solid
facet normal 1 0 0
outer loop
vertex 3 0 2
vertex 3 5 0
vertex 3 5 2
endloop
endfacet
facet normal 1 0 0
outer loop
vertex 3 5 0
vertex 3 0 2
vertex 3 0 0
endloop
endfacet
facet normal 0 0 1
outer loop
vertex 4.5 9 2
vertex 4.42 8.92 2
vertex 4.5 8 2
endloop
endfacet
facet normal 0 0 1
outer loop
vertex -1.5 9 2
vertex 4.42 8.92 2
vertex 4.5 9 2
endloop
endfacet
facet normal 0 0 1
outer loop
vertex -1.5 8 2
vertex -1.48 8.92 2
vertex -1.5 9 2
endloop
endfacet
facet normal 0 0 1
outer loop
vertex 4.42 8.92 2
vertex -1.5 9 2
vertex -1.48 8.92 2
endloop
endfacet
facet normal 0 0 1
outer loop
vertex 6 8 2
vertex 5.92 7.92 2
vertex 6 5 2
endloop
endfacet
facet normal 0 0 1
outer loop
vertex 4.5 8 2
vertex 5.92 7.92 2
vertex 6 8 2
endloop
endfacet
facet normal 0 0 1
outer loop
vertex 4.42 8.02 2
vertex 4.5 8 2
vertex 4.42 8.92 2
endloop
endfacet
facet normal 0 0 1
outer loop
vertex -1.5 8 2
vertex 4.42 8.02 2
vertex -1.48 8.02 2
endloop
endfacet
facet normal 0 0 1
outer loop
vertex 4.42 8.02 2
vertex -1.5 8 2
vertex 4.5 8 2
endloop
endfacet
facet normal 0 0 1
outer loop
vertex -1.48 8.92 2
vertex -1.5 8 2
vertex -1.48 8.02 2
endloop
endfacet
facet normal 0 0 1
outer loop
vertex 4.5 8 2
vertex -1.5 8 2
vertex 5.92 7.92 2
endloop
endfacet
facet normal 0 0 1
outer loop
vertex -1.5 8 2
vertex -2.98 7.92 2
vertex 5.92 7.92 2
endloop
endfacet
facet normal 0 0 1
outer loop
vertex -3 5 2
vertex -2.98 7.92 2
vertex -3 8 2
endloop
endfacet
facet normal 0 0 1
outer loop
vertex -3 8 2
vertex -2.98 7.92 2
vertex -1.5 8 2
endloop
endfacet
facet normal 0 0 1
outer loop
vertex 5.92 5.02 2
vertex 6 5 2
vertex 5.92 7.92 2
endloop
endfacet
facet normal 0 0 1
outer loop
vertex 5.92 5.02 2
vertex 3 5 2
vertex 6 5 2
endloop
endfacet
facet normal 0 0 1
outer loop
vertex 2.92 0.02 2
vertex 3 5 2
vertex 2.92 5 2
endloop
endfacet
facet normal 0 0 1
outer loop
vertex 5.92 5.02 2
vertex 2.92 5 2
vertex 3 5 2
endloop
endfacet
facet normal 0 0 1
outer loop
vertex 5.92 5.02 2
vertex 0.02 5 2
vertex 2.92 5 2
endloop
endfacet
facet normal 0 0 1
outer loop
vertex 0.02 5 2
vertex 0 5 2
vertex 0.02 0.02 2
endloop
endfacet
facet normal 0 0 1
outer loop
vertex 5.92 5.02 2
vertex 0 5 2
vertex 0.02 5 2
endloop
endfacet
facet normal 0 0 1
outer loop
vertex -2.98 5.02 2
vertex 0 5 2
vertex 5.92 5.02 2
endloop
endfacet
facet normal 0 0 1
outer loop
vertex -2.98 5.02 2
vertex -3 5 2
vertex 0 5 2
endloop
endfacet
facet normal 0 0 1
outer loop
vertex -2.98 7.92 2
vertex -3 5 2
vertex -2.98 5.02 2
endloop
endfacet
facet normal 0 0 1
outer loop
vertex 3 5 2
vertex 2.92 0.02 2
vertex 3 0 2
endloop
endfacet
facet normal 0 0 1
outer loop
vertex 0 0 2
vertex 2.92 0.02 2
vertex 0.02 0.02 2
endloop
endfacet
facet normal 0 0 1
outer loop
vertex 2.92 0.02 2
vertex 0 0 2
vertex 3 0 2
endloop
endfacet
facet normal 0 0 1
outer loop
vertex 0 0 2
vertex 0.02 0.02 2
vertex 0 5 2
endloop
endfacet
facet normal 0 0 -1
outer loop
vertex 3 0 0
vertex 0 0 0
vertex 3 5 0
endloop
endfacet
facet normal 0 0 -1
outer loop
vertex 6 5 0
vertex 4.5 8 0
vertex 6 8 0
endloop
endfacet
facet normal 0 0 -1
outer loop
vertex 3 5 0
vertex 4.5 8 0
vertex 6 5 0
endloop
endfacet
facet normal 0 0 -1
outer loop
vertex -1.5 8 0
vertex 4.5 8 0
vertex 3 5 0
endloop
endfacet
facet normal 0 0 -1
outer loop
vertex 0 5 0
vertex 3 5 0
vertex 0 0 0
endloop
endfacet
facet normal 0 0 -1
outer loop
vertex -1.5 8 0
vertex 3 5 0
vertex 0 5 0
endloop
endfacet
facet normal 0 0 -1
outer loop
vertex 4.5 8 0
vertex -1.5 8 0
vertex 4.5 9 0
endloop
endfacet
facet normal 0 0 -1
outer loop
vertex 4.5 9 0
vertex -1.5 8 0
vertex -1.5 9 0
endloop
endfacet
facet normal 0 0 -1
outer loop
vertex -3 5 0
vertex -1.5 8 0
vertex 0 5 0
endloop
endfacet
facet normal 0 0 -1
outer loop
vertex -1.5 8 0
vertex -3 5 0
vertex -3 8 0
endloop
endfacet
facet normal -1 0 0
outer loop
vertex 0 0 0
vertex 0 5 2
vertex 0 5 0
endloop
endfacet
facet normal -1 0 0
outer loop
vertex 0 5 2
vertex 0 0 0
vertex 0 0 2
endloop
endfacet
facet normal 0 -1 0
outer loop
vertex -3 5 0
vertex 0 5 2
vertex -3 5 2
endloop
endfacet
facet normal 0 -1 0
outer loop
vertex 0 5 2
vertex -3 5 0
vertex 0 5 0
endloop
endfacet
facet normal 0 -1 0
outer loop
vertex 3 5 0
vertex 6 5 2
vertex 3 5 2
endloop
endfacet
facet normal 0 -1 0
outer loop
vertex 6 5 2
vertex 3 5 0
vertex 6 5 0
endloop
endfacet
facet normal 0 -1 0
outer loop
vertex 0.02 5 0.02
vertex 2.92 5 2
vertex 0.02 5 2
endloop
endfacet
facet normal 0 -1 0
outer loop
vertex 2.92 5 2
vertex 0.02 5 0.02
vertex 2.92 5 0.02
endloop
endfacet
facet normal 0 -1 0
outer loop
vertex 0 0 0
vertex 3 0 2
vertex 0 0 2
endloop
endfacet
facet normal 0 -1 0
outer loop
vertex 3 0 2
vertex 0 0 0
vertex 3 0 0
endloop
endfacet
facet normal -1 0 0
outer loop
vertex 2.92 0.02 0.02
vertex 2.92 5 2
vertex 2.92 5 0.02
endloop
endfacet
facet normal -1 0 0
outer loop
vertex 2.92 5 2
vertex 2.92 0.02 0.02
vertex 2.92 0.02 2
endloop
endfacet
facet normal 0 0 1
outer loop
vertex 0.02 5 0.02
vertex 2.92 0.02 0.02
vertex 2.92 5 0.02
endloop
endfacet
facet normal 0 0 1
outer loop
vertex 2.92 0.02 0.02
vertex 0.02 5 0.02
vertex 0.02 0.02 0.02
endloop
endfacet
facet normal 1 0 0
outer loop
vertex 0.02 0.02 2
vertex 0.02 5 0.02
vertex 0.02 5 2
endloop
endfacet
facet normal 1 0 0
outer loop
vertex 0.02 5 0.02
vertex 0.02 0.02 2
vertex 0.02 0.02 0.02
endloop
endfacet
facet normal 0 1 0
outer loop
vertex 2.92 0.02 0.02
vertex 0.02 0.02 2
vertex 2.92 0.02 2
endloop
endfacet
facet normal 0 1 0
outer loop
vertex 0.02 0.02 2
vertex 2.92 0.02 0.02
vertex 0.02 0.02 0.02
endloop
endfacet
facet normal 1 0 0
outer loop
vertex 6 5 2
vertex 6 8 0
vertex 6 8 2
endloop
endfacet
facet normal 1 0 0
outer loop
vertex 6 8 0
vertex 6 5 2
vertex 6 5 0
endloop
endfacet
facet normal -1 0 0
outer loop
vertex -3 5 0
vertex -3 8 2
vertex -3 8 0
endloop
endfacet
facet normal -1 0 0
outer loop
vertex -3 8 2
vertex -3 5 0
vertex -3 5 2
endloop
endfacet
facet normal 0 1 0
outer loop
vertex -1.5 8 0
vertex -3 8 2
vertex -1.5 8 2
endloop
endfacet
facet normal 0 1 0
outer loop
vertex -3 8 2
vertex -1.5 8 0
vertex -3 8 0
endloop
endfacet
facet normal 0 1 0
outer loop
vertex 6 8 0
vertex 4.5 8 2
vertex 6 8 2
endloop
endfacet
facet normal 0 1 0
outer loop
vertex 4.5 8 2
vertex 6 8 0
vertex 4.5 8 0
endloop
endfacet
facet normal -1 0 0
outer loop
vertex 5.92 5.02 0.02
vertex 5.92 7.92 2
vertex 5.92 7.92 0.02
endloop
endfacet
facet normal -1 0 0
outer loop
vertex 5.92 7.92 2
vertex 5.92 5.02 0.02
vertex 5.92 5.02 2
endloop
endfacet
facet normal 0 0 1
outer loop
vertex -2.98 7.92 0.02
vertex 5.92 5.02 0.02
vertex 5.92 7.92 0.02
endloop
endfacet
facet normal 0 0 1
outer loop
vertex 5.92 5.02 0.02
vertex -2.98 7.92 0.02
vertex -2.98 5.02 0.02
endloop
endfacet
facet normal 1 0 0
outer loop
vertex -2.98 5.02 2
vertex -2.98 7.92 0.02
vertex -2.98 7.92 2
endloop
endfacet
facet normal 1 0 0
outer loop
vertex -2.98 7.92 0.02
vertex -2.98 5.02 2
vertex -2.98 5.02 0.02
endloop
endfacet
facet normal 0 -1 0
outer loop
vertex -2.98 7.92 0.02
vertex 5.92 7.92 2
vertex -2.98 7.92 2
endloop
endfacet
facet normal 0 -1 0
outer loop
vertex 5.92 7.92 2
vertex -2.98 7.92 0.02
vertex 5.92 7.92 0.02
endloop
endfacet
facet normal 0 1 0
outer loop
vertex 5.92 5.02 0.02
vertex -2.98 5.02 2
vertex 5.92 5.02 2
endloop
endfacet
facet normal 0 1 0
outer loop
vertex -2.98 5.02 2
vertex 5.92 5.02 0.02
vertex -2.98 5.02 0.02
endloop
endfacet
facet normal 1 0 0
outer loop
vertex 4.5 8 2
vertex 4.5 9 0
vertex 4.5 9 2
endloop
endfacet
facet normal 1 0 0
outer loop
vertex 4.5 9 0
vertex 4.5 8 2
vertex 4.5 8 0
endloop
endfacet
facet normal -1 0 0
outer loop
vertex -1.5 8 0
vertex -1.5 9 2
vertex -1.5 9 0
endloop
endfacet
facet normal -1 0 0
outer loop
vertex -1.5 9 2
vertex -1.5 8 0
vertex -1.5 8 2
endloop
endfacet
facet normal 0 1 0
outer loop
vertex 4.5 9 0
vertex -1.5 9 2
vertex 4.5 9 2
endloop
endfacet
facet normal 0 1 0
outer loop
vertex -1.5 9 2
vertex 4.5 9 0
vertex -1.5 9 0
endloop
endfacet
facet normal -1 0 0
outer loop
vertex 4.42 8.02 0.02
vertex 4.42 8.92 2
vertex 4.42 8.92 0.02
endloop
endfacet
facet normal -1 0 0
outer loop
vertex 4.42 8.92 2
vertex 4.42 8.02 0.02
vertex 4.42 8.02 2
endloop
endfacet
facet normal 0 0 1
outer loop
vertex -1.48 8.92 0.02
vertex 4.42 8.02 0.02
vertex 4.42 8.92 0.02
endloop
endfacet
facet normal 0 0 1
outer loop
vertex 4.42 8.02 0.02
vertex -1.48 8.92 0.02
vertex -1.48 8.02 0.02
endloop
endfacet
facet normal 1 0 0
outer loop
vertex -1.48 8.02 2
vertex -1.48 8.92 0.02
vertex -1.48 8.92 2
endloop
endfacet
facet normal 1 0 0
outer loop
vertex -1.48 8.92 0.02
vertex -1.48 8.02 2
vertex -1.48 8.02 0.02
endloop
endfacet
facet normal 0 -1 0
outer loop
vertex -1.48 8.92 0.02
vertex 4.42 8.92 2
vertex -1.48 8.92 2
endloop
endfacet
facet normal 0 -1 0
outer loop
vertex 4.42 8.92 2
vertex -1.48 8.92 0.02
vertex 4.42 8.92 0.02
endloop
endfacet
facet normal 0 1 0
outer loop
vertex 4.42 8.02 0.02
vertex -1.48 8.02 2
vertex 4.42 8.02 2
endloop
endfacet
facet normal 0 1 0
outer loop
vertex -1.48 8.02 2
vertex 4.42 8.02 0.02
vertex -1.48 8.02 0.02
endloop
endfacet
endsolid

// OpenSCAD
//Question 3
//color("#088F8F"){
//    cube([6, 2, 2]);
//    translate([-1, 2, 0])
//        cube([8, 3, 2]);
//    translate([1.5, 5, 0])
//        cube([3, 5, 2]);
//    }

//OR
color("#088F8F", 1){
  difference(){
        cube([3, 5, 2]);
        translate([0.02, 0.02, 0.02]){
            cube([2.9, 5, 2]);
    }  
  }
}
color("#088F8F", 1){
    translate([-3, 5, 0]){
    difference(){
        cube([9, 3, 2]);
        translate([0.02, 0.02, 0.02]){
            cube([8.9, 2.9, 2]);
    }  
}
}
color("#088F8F", 1){
    translate([-1.5, 8, 0]){
    difference(){
        cube([6, 1, 2]);
        translate([0.02, 0.02, 0.02]){
            cube([5.9, 0.9, 2]);
    }  
}
}
}
}
